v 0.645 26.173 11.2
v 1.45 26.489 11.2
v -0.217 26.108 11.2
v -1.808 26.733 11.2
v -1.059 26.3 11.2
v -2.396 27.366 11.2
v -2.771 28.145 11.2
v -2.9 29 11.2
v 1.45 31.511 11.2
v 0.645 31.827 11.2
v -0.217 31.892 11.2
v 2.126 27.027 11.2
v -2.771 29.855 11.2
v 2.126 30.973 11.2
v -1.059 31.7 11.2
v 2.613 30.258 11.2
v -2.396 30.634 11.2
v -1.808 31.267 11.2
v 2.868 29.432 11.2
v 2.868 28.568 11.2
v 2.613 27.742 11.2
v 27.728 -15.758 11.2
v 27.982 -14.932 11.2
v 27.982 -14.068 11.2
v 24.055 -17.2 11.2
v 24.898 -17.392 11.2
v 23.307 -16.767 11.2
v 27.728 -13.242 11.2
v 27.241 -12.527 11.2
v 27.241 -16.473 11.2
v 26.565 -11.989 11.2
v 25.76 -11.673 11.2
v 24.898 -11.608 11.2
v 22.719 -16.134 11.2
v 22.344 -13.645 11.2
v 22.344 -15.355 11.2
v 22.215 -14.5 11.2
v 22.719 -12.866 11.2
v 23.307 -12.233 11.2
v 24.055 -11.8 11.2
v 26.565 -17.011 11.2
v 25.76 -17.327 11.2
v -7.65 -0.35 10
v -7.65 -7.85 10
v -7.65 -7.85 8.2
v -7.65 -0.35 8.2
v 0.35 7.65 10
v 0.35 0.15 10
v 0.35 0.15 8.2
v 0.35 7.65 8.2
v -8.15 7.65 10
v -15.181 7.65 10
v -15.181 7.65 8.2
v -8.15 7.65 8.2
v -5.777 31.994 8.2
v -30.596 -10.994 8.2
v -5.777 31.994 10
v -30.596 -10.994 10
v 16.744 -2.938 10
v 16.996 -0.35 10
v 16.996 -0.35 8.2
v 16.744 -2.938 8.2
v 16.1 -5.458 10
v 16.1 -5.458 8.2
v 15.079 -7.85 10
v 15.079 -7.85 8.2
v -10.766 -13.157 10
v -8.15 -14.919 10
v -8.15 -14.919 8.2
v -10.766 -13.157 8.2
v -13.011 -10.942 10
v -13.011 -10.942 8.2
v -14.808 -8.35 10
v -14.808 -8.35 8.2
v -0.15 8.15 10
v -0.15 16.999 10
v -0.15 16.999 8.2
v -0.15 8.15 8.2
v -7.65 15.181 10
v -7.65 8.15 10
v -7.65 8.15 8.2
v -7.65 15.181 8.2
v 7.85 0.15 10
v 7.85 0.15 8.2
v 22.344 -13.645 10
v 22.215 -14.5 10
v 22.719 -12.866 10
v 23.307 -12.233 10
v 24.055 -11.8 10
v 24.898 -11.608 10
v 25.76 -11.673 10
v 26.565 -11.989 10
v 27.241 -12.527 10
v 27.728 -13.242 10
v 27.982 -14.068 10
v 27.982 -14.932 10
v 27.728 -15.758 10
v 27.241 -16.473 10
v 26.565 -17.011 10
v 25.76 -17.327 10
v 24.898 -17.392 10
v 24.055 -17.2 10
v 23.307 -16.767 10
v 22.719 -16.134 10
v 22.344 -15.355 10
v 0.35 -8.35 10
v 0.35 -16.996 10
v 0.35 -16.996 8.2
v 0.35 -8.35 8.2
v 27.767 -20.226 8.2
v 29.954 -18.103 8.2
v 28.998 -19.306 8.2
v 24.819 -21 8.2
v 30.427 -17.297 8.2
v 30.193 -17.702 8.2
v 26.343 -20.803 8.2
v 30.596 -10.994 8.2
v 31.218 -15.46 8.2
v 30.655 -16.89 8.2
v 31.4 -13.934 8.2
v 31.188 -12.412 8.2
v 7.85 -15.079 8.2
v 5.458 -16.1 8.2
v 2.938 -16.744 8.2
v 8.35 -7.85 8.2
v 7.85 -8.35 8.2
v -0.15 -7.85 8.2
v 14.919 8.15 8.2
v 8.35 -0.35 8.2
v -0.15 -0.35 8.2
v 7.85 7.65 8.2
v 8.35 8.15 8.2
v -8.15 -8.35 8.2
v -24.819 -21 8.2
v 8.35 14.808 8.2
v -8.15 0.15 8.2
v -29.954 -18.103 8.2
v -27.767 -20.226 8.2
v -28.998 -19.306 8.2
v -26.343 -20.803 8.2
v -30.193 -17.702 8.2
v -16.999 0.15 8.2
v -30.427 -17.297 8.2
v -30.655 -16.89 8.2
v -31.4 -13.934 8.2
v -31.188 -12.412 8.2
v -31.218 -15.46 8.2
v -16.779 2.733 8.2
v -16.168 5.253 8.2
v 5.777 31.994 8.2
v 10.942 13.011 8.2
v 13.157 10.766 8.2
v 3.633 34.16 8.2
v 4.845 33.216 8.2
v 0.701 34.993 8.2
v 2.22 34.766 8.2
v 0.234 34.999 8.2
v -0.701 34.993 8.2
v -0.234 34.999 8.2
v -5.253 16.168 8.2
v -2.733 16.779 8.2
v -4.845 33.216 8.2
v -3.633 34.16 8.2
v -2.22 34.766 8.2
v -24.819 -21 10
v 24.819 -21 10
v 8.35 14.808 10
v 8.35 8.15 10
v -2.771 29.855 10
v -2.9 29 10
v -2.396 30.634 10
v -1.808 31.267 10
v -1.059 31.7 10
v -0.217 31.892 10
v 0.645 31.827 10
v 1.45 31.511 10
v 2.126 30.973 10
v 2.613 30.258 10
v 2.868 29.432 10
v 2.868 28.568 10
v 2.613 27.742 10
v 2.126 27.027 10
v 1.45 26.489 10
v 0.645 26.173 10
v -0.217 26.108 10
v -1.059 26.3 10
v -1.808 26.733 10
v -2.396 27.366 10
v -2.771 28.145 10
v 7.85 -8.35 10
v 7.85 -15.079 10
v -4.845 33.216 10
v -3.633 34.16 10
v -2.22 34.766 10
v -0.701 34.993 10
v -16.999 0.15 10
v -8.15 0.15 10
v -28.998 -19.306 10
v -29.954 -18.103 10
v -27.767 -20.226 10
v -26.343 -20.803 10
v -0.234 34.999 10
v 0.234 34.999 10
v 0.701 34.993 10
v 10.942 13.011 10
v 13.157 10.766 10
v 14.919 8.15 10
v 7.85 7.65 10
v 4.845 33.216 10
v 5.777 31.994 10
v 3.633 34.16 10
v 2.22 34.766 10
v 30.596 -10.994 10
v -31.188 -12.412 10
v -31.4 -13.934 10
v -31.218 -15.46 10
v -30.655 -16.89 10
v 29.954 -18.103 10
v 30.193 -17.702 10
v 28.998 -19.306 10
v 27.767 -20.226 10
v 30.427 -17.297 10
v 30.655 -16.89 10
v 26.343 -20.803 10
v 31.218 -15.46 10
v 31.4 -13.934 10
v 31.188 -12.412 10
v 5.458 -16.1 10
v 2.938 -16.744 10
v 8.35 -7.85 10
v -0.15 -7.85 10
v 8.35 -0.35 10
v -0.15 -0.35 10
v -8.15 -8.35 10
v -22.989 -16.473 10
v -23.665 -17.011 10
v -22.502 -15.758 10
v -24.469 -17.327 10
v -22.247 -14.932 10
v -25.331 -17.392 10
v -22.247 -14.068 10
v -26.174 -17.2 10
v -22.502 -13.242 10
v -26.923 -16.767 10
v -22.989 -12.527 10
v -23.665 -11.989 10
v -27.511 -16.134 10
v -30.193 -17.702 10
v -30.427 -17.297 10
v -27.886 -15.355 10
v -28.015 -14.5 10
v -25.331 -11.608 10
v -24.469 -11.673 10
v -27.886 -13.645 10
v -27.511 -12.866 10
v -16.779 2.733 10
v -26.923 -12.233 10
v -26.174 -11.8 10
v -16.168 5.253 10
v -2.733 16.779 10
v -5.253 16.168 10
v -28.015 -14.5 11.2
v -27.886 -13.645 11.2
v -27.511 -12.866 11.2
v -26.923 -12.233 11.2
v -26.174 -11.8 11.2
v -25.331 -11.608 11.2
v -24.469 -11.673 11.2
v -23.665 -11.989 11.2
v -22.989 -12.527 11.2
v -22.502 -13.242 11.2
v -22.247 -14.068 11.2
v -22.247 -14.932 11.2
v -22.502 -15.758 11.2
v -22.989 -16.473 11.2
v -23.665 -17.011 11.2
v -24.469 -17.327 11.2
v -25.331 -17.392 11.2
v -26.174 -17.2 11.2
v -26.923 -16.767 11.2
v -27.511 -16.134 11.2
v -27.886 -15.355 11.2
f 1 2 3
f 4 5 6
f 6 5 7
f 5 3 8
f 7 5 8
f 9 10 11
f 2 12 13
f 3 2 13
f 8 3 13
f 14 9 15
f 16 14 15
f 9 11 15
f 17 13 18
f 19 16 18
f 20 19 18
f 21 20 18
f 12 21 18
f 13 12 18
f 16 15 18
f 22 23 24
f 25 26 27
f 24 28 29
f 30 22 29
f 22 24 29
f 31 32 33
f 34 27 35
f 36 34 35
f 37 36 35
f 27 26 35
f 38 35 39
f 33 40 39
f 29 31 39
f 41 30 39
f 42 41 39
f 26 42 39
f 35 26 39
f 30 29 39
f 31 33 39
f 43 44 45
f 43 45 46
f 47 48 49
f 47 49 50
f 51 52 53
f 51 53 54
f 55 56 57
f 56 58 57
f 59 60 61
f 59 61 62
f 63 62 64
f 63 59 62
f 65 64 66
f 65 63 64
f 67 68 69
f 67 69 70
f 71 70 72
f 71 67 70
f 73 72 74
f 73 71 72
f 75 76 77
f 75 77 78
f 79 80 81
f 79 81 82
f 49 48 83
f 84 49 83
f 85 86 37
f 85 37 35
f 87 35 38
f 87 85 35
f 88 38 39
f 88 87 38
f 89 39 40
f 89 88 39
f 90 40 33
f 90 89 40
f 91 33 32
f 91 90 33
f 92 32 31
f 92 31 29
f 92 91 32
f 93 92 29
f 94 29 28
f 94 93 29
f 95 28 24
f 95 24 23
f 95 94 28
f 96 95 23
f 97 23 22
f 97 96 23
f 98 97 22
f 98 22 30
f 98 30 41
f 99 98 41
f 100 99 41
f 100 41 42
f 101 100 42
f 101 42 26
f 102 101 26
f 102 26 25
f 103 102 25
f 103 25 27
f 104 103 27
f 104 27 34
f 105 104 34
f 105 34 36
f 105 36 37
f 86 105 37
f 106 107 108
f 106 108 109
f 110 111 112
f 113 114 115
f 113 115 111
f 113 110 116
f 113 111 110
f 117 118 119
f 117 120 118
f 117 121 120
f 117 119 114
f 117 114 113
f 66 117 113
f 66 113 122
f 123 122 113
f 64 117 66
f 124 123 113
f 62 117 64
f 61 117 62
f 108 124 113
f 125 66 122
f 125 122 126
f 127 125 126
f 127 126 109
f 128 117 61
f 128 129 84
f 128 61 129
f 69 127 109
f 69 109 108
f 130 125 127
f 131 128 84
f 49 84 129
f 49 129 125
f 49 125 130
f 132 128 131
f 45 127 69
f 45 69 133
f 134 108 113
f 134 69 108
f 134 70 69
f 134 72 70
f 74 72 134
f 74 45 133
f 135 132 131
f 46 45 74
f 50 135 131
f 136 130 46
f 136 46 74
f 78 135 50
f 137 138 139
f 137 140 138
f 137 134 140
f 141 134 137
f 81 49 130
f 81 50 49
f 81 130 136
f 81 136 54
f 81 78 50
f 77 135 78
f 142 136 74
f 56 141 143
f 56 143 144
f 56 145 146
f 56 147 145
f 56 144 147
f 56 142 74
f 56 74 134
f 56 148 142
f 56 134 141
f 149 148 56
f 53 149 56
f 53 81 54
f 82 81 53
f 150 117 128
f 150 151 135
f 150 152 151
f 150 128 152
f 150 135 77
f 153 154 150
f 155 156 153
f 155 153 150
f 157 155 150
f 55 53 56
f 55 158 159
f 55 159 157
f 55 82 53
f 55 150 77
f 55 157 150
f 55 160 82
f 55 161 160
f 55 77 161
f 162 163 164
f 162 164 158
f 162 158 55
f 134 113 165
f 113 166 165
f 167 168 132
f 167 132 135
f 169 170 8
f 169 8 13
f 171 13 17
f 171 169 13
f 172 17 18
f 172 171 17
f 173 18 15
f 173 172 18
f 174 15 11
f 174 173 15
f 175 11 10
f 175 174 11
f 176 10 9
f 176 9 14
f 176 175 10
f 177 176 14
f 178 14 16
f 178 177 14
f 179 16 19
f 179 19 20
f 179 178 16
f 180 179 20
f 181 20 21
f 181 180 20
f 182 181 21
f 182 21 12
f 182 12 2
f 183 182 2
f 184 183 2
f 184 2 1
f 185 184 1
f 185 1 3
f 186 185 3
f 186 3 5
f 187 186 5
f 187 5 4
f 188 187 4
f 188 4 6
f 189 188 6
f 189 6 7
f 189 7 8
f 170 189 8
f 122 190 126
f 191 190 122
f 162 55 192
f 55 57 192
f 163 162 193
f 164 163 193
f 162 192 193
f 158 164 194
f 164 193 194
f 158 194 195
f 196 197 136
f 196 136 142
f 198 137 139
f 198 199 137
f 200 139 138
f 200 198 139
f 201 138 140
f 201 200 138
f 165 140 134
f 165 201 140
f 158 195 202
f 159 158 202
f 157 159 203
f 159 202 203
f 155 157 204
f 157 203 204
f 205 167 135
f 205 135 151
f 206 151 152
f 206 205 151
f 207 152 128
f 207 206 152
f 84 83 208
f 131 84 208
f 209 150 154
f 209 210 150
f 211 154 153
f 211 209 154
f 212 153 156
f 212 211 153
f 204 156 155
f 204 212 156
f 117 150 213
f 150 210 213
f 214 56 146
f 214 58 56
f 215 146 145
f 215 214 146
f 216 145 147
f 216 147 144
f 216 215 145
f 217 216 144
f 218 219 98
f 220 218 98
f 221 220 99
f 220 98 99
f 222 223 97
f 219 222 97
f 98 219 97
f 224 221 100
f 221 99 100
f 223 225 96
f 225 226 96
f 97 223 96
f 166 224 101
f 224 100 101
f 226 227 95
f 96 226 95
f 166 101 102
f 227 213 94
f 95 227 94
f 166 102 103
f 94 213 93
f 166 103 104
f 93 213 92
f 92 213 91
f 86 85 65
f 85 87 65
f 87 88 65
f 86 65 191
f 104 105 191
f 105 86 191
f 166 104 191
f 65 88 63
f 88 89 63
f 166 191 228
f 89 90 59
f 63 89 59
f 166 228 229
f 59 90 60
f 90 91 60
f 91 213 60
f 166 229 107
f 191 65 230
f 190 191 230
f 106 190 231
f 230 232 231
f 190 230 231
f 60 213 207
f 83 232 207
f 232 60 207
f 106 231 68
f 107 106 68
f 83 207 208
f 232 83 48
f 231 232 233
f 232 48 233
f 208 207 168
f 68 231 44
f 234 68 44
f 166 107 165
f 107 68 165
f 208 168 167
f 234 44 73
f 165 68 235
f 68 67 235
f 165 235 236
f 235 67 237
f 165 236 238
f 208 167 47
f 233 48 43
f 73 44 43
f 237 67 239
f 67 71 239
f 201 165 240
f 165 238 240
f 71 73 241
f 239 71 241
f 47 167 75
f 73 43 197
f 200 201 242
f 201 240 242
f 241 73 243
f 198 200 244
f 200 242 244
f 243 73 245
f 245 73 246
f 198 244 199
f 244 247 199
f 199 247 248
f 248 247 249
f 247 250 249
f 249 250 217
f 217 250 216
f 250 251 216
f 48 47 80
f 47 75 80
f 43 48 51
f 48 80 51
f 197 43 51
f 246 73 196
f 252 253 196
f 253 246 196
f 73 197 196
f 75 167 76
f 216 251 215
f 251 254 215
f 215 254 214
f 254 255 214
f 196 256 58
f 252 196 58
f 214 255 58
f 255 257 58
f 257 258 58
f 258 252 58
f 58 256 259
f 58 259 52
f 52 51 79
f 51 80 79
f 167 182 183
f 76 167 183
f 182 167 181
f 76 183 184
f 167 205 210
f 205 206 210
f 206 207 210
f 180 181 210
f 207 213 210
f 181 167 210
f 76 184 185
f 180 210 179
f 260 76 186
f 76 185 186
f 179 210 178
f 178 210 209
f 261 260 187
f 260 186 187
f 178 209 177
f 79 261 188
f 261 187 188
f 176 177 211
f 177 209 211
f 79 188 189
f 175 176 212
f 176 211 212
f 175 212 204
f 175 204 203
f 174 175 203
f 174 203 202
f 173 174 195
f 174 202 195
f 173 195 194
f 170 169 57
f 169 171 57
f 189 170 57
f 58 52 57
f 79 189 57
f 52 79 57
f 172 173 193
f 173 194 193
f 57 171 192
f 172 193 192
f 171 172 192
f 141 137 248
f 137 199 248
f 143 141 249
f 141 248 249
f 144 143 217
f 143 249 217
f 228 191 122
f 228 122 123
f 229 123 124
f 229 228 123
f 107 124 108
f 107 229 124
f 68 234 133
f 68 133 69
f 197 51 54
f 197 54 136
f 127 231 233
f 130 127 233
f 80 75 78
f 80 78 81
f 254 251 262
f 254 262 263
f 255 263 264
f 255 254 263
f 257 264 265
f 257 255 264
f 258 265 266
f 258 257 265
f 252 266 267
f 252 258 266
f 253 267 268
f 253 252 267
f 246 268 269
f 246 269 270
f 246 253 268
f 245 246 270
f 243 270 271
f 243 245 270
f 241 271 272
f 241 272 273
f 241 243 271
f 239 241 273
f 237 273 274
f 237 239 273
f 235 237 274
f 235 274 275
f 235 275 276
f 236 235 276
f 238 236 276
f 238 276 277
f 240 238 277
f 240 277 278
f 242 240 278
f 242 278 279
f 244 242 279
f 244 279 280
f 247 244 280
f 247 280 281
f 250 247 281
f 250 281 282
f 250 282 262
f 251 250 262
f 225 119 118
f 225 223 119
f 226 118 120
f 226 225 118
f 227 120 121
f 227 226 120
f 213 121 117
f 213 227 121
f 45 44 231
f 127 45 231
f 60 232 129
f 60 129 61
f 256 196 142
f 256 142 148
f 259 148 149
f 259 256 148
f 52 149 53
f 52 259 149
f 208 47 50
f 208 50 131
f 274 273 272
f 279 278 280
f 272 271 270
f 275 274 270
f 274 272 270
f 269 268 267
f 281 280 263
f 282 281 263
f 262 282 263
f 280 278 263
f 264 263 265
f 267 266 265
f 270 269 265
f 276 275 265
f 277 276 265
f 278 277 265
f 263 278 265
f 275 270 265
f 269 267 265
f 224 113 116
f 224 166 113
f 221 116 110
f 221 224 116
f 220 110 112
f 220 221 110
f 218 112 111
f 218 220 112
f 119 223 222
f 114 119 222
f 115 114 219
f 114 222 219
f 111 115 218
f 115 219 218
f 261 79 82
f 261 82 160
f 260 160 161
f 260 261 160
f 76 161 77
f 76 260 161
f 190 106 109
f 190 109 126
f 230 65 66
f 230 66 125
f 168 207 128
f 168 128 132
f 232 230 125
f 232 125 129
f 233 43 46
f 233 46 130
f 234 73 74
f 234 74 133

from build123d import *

# Parameters (mm, degrees)
SKETCH2_R               = 18
SKETCH2_W               = 7.5
SKETCH2_H               = 7.5
BOSS_EXTRUDE1_DEPTH     = 1.8
BOSS_EXTRUDE10_START    = 1.8
SKETCH18_W              = 7.7
SKETCH18_H              = 7.7
BOSS_EXTRUDE10_DEPTH    = 1.8
BOSS_EXTRUDE2_START     = -1.8
SKETCH3_R               = 35
SKETCH3_R_2             = 18
BOSS_EXTRUDE2_DEPTH     = 1.8
SKETCH4_R               = 2.9
BOSS_EXTRUDE3_DEPTH     = 3
CUT_EXTRUDE1_DEPTH      = 50.588305073
CUT_EXTRUDE1_DEPTH_BACK = 50.588305073
SKETCH7_R               = 59.131365533
FILLET1_R               = 6


with BuildPart() as part:
    # Sketch2 → Boss-Extrude1 (new body)
    with BuildSketch(Plane.XY.offset(10)):
        Circle(SKETCH2_R)
        with BuildLine():
            Line((-8.15, -8.35), (-8.15, -14.91903147))
            ThreePointArc((-8.15, -14.91903147), (-11.939670478, -12.101415986), (-14.808021475, -8.35))
            Line((-14.808021475, -8.35), (-8.15, -8.35))
        make_face(mode=Mode.SUBTRACT)
        with BuildLine():
            Line((-8.15, -7.85), (-15.079041747, -7.85))
            ThreePointArc((-15.079041747, -7.85), (-16.470304718, -4.210589327), (-16.996396677, -0.35))
            Line((-16.996396677, -0.35), (-8.15, -0.35))
            Line((-8.15, -0.35), (-8.15, -7.85))
        make_face(mode=Mode.SUBTRACT)
        with BuildLine():
            Line((-8.15, 0.15), (-16.999338222, 0.15))
            ThreePointArc((-16.999338222, 0.15), (-16.521617742, 4.00451585), (-15.181485435, 7.65))
            Line((-15.181485435, 7.65), (-8.15, 7.65))
            Line((-8.15, 7.65), (-8.15, 0.15))
        make_face(mode=Mode.SUBTRACT)
        with BuildLine():
            Line((-8.15, 8.15), (-14.91903147, 8.15))
            ThreePointArc((-14.91903147, 8.15), (-12.02081528, 12.02081528), (-8.15, 14.91903147))
            Line((-8.15, 14.91903147), (-8.15, 8.15))
        make_face(mode=Mode.SUBTRACT)
        with BuildLine():
            Line((-7.65, 8.15), (-7.65, 15.181485435))
            ThreePointArc((-7.65, 15.181485435), (-4.00451585, 16.521617742), (-0.15, 16.999338222))
            Line((-0.15, 16.999338222), (-0.15, 8.15))
            Line((-0.15, 8.15), (-7.65, 8.15))
        make_face(mode=Mode.SUBTRACT)
        with BuildLine():
            Line((0.35, 8.15), (0.35, 16.996396677))
            ThreePointArc((0.35, 16.996396677), (4.210589327, 16.470304718), (7.85, 15.079041747))
            Line((7.85, 15.079041747), (7.85, 8.15))
            Line((7.85, 8.15), (0.35, 8.15))
        make_face(mode=Mode.SUBTRACT)
        with BuildLine():
            Line((8.35, 8.15), (8.35, 14.808021475))
            ThreePointArc((8.35, 14.808021475), (12.101415986, 11.939670478), (14.91903147, 8.15))
            Line((14.91903147, 8.15), (8.35, 8.15))
        make_face(mode=Mode.SUBTRACT)
        with BuildLine():
            Line((8.35, 7.65), (15.181485435, 7.65))
            ThreePointArc((15.181485435, 7.65), (16.521617742, 4.00451585), (16.999338222, 0.15))
            Line((16.999338222, 0.15), (8.35, 0.15))
            Line((8.35, 0.15), (8.35, 7.65))
        make_face(mode=Mode.SUBTRACT)
        with BuildLine():
            Line((8.35, -0.35), (16.996396677, -0.35))
            ThreePointArc((16.996396677, -0.35), (16.470304718, -4.210589327), (15.079041747, -7.85))
            Line((15.079041747, -7.85), (8.35, -7.85))
            Line((8.35, -7.85), (8.35, -0.35))
        make_face(mode=Mode.SUBTRACT)
        with BuildLine():
            Line((8.35, -8.35), (14.808021475, -8.35))
            ThreePointArc((14.808021475, -8.35), (12.02081528, -12.02081528), (8.35, -14.808021475))
            Line((8.35, -14.808021475), (8.35, -8.35))
        make_face(mode=Mode.SUBTRACT)
        with BuildLine():
            Line((7.85, -8.35), (7.85, -15.079041747))
            ThreePointArc((7.85, -15.079041747), (4.210589327, -16.470304718), (0.35, -16.996396677))
            Line((0.35, -16.996396677), (0.35, -8.35))
            Line((0.35, -8.35), (7.85, -8.35))
        make_face(mode=Mode.SUBTRACT)
        with BuildLine():
            Line((-0.15, -8.35), (-0.15, -16.999338222))
            ThreePointArc((-0.15, -16.999338222), (-4.00451585, -16.521617742), (-7.65, -15.181485435))
            Line((-7.65, -15.181485435), (-7.65, -8.35))
            Line((-7.65, -8.35), (-0.15, -8.35))
        make_face(mode=Mode.SUBTRACT)
        with Locations((-3.9, -4.1)):
            Rectangle(SKETCH2_W, SKETCH2_H, mode=Mode.SUBTRACT)
        with Locations((4.1, -4.1)):
            Rectangle(SKETCH2_W, SKETCH2_H, mode=Mode.SUBTRACT)
        with Locations((-3.9, 3.9)):
            Rectangle(SKETCH2_W, SKETCH2_H, mode=Mode.SUBTRACT)
        with Locations((4.1, 3.9)):
            Rectangle(SKETCH2_W, SKETCH2_H, mode=Mode.SUBTRACT)
    extrude(amount=-BOSS_EXTRUDE1_DEPTH)

    # Sketch18 → Boss-Extrude10 (add)
    with BuildSketch(Plane.XY.offset(8.2).offset(BOSS_EXTRUDE10_START)):
        with BuildLine():
            ThreePointArc((7.85, 15.079041747), (4.11362184, 16.494790552), (0.15, 16.999338222))
            Line((0.15, 16.999338222), (0.15, 8.15))
            Line((0.15, 8.15), (7.85, 8.15))
            Line((7.85, 8.15), (7.85, 15.079041747))
        make_face()
        with BuildLine():
            Line((8.15, 0.15), (16.999338222, 0.15))
            ThreePointArc((16.999338222, 0.15), (16.494790552, 4.11362184), (15.079041747, 7.85))
            Line((15.079041747, 7.85), (8.15, 7.85))
            Line((8.15, 7.85), (8.15, 0.15))
        make_face()
        with Locations((-4, 4)):
            Rectangle(SKETCH18_W, SKETCH18_H)
        with Locations((4, -4)):
            Rectangle(SKETCH18_W, SKETCH18_H)
        with BuildLine():
            Line((8.15, -8.15), (8.15, -14.91903147))
            ThreePointArc((8.15, -14.91903147), (12.02081528, -12.02081528), (14.91903147, -8.15))
            Line((14.91903147, -8.15), (8.15, -8.15))
        make_face()
        with BuildLine():
            Line((-7.85, -8.15), (-7.85, -15.079041747))
            ThreePointArc((-7.85, -15.079041747), (-4.11362184, -16.494790552), (-0.15, -16.999338222))
            Line((-0.15, -16.999338222), (-0.15, -8.15))
            Line((-0.15, -8.15), (-7.85, -8.15))
        make_face()
        with BuildLine():
            ThreePointArc((-16.999338222, -0.15), (-16.494790552, -4.11362184), (-15.079041747, -7.85))
            Line((-15.079041747, -7.85), (-8.15, -7.85))
            Line((-8.15, -7.85), (-8.15, -0.15))
            Line((-8.15, -0.15), (-16.999338222, -0.15))
        make_face()
        with BuildLine():
            ThreePointArc((-8.15, 14.91903147), (-12.02081528, 12.02081528), (-14.91903147, 8.15))
            Line((-14.91903147, 8.15), (-8.15, 8.15))
            Line((-8.15, 8.15), (-8.15, 14.91903147))
        make_face()
    extrude(amount=-BOSS_EXTRUDE10_DEPTH)

    # Sketch3 → Boss-Extrude2 (add)
    with BuildSketch(Plane(origin=(0, 0, 8.2), x_dir=(-1, 0, 0), z_dir=(0, 0, -1)).offset(BOSS_EXTRUDE2_START)):
        Circle(SKETCH3_R)
        Circle(SKETCH3_R_2, mode=Mode.SUBTRACT)
    extrude(amount=BOSS_EXTRUDE2_DEPTH)

    # Sketch4 → Boss-Extrude3 (add)
    with BuildSketch(Plane(origin=(0, 0, 8.2), x_dir=(-1, 0, 0), z_dir=(0, 0, -1))):
        with Locations((0, 29)):
            Circle(SKETCH4_R)
        with Locations((25.11473671, -14.5)):
            Circle(SKETCH4_R)
        with Locations((-25.11473671, -14.5)):
            Circle(SKETCH4_R)
    extrude(amount=-BOSS_EXTRUDE3_DEPTH)

    # Sketch7 → Cut-Extrude1 (cut, two sides: drawn at the far end of the back side and taken through both)
    with BuildSketch(Plane(origin=(0, 0, 8.2), x_dir=(-1, 0, 0), z_dir=(0, 0, -1)).offset(-CUT_EXTRUDE1_DEPTH_BACK)):
        Circle(SKETCH7_R)
        Polygon((0, 42), (-36.373066959, -21), (36.373066959, -21), align=None, mode=Mode.SUBTRACT)
    extrude(amount=CUT_EXTRUDE1_DEPTH + CUT_EXTRUDE1_DEPTH_BACK, mode=Mode.SUBTRACT)

    # Fillet1
    fillet1_edges = [part.edges().sort_by_distance(p)[0] for p in [
        (4.186533479, 34.748711306, 9.1),
        (32.186533479, -13.748711306, 9.1),
        (28, -21, 9.1),
        (-28, -21, 9.1),
        (-32.186533479, -13.748711306, 9.1),
        (-4.186533479, 34.748711306, 9.1),
    ]]
    fillet(fillet1_edges, radius=FILLET1_R)


solid = part.part
